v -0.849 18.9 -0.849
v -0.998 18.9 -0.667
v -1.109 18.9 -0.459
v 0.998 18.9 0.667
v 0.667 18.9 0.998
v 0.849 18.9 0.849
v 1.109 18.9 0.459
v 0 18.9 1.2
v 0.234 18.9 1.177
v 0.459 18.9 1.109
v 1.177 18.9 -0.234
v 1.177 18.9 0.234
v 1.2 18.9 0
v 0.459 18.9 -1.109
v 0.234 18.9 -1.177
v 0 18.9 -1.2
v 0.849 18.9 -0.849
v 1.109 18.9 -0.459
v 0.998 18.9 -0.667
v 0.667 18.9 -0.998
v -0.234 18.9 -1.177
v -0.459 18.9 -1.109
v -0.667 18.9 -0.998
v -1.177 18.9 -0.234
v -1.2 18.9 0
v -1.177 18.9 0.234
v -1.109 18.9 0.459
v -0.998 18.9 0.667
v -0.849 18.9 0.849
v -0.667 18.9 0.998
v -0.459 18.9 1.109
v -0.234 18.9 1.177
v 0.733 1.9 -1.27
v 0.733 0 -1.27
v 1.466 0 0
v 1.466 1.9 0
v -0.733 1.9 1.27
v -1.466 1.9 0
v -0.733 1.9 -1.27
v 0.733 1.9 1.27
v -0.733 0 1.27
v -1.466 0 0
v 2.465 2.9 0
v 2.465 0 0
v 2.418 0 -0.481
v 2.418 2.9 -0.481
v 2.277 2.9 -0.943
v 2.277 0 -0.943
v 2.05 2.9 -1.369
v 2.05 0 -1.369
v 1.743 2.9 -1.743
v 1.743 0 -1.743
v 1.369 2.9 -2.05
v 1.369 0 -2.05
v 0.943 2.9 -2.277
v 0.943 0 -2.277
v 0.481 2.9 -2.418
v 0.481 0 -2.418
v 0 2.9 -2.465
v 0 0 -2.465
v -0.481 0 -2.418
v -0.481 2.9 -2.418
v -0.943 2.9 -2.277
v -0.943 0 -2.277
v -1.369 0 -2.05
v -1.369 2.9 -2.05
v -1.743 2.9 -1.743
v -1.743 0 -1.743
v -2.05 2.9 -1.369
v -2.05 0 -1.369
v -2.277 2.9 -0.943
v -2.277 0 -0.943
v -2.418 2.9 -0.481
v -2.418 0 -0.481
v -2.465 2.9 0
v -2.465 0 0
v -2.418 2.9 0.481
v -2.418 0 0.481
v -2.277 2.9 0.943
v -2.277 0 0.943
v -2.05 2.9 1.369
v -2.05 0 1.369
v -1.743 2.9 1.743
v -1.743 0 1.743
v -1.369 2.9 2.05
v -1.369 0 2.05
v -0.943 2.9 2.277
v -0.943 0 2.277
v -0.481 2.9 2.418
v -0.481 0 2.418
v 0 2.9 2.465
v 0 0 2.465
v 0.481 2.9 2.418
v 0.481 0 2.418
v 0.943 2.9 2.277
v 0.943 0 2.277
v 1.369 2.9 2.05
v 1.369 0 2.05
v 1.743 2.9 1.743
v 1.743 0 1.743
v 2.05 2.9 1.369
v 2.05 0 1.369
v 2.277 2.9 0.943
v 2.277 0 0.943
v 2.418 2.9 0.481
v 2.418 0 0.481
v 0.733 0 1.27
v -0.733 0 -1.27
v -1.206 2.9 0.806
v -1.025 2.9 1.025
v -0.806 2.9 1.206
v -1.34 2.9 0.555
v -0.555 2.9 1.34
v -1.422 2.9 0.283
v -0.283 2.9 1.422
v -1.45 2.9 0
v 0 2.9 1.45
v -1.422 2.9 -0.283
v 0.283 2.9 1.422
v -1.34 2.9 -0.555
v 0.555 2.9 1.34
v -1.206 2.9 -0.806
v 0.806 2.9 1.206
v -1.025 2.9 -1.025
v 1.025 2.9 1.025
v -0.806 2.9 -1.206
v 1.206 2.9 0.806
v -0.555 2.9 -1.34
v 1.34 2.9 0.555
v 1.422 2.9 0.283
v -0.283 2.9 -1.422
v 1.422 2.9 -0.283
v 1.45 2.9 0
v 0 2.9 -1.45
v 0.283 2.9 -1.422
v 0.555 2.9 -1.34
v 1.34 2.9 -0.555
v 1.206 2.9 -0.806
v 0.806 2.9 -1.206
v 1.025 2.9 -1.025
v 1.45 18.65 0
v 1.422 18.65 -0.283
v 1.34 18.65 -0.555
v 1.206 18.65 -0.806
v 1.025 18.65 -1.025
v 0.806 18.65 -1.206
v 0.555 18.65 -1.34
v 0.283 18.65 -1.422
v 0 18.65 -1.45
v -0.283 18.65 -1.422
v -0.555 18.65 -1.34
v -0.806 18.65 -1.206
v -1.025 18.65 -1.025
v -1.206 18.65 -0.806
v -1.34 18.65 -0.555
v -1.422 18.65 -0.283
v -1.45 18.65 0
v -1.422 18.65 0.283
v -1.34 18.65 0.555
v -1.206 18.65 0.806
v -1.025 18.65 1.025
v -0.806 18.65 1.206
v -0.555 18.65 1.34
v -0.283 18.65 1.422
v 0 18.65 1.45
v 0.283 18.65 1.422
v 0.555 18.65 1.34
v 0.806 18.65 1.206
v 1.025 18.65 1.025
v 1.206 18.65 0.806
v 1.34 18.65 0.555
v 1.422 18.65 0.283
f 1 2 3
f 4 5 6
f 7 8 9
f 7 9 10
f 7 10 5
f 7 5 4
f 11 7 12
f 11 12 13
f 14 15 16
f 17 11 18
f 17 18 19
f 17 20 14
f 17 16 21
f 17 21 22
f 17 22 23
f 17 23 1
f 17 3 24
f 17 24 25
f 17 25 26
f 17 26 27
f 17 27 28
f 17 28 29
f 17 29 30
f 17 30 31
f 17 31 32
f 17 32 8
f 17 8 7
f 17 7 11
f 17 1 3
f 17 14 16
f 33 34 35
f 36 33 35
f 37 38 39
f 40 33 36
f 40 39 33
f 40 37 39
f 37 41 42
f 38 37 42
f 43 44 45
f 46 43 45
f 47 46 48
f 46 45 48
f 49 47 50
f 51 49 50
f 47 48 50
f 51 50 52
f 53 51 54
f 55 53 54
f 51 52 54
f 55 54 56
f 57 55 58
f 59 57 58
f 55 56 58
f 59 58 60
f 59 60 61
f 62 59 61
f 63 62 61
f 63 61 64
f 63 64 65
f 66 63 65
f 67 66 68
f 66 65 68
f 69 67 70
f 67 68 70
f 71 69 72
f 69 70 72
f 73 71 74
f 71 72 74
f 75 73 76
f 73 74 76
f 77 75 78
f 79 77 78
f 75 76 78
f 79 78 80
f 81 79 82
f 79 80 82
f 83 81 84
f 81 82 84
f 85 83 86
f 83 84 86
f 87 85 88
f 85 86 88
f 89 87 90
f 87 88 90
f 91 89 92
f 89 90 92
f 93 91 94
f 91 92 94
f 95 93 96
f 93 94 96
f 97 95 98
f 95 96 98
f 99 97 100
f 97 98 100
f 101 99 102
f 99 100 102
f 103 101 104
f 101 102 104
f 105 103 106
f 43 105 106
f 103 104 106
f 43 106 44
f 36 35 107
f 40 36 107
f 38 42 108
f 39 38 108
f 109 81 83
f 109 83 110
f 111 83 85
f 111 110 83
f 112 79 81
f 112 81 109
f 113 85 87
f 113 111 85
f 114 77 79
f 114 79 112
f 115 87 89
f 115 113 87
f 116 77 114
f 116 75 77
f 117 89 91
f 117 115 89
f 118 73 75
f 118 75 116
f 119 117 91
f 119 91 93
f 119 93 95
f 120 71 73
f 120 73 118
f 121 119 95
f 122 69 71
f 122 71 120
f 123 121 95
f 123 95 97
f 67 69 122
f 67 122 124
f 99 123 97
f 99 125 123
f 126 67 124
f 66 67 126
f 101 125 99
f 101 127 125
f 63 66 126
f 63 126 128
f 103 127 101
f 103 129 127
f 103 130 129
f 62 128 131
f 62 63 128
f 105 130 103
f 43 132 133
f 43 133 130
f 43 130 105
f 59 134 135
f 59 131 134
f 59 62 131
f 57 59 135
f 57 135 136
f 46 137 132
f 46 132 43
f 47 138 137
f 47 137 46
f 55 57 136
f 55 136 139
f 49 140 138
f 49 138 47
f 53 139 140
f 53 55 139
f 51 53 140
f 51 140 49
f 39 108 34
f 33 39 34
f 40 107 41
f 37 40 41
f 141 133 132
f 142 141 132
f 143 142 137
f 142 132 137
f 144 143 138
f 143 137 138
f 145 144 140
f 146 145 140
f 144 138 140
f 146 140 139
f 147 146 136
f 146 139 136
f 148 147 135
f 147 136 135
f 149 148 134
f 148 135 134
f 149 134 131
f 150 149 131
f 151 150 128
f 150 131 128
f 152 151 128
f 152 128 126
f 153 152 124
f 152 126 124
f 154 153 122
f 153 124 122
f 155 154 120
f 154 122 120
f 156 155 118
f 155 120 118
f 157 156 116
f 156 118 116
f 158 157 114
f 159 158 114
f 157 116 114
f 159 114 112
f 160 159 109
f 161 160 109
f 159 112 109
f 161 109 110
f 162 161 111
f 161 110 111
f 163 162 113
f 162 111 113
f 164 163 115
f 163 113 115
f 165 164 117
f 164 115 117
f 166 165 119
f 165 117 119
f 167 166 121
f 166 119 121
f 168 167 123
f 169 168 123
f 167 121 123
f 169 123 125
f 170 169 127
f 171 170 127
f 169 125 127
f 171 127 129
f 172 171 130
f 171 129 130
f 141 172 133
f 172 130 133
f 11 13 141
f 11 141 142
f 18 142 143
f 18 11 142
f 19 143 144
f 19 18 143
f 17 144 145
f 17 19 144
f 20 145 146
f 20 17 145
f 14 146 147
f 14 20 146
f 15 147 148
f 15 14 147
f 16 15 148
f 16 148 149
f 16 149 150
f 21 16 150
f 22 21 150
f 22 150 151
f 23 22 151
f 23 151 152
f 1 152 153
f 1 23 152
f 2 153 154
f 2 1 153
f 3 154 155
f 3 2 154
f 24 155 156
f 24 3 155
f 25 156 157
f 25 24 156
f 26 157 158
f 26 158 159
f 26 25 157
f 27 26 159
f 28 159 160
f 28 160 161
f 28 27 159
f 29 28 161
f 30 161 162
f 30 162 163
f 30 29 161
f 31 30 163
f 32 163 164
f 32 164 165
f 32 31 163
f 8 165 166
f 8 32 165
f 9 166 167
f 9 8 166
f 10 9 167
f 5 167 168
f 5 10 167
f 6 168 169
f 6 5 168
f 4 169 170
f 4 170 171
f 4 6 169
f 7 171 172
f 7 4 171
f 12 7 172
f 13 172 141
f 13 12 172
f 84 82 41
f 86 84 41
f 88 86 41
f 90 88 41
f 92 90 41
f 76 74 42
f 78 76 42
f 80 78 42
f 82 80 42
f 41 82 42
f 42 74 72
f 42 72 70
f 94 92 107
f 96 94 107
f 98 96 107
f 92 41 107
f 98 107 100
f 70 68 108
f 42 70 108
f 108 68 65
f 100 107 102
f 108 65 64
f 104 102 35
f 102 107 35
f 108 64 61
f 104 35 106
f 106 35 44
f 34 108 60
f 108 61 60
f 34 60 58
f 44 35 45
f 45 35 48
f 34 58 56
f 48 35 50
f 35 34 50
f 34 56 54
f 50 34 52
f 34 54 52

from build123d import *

# Parameters (mm, degrees)
SKETCH1_R           = 2.465
BOSS_EXTRUDE1_DEPTH = 2.9
SKETCH2_R           = 1.45
BOSS_EXTRUDE2_DEPTH = 16
CUT_EXTRUDE1_DEPTH  = 1.9
CHAMFER1_SIZE       = 0.25


with BuildPart() as part:
    # Sketch1 → Boss-Extrude1 (new body)
    with BuildSketch(Plane(origin=(0, 0, 0), x_dir=(1, 0, 0), z_dir=(0, 1, 0))):
        Circle(SKETCH1_R)
    extrude(amount=BOSS_EXTRUDE1_DEPTH)

    # Sketch2 → Boss-Extrude2 (add)
    with BuildSketch(Plane(origin=(0, 2.9, 0), x_dir=(1, 0, 0), z_dir=(0, 1, 0))):
        Circle(SKETCH2_R)
    extrude(amount=BOSS_EXTRUDE2_DEPTH)

    # Sketch3 → Cut-Extrude1 (cut)
    with BuildSketch(Plane.XZ):
        Polygon((0.733234842, -1.27), (1.466469684, 0), (0.733234842, 1.27), (-0.733234842, 1.27), (-1.466469684, 0), (-0.733234842, -1.27), align=None)
    extrude(amount=-CUT_EXTRUDE1_DEPTH, mode=Mode.SUBTRACT)

    # Chamfer1
    chamfer1_edges = [part.edges().sort_by_distance(p)[0] for p in [
        (-1.45, 18.9, 0),
    ]]
    chamfer(chamfer1_edges, length=CHAMFER1_SIZE)


solid = part.part
